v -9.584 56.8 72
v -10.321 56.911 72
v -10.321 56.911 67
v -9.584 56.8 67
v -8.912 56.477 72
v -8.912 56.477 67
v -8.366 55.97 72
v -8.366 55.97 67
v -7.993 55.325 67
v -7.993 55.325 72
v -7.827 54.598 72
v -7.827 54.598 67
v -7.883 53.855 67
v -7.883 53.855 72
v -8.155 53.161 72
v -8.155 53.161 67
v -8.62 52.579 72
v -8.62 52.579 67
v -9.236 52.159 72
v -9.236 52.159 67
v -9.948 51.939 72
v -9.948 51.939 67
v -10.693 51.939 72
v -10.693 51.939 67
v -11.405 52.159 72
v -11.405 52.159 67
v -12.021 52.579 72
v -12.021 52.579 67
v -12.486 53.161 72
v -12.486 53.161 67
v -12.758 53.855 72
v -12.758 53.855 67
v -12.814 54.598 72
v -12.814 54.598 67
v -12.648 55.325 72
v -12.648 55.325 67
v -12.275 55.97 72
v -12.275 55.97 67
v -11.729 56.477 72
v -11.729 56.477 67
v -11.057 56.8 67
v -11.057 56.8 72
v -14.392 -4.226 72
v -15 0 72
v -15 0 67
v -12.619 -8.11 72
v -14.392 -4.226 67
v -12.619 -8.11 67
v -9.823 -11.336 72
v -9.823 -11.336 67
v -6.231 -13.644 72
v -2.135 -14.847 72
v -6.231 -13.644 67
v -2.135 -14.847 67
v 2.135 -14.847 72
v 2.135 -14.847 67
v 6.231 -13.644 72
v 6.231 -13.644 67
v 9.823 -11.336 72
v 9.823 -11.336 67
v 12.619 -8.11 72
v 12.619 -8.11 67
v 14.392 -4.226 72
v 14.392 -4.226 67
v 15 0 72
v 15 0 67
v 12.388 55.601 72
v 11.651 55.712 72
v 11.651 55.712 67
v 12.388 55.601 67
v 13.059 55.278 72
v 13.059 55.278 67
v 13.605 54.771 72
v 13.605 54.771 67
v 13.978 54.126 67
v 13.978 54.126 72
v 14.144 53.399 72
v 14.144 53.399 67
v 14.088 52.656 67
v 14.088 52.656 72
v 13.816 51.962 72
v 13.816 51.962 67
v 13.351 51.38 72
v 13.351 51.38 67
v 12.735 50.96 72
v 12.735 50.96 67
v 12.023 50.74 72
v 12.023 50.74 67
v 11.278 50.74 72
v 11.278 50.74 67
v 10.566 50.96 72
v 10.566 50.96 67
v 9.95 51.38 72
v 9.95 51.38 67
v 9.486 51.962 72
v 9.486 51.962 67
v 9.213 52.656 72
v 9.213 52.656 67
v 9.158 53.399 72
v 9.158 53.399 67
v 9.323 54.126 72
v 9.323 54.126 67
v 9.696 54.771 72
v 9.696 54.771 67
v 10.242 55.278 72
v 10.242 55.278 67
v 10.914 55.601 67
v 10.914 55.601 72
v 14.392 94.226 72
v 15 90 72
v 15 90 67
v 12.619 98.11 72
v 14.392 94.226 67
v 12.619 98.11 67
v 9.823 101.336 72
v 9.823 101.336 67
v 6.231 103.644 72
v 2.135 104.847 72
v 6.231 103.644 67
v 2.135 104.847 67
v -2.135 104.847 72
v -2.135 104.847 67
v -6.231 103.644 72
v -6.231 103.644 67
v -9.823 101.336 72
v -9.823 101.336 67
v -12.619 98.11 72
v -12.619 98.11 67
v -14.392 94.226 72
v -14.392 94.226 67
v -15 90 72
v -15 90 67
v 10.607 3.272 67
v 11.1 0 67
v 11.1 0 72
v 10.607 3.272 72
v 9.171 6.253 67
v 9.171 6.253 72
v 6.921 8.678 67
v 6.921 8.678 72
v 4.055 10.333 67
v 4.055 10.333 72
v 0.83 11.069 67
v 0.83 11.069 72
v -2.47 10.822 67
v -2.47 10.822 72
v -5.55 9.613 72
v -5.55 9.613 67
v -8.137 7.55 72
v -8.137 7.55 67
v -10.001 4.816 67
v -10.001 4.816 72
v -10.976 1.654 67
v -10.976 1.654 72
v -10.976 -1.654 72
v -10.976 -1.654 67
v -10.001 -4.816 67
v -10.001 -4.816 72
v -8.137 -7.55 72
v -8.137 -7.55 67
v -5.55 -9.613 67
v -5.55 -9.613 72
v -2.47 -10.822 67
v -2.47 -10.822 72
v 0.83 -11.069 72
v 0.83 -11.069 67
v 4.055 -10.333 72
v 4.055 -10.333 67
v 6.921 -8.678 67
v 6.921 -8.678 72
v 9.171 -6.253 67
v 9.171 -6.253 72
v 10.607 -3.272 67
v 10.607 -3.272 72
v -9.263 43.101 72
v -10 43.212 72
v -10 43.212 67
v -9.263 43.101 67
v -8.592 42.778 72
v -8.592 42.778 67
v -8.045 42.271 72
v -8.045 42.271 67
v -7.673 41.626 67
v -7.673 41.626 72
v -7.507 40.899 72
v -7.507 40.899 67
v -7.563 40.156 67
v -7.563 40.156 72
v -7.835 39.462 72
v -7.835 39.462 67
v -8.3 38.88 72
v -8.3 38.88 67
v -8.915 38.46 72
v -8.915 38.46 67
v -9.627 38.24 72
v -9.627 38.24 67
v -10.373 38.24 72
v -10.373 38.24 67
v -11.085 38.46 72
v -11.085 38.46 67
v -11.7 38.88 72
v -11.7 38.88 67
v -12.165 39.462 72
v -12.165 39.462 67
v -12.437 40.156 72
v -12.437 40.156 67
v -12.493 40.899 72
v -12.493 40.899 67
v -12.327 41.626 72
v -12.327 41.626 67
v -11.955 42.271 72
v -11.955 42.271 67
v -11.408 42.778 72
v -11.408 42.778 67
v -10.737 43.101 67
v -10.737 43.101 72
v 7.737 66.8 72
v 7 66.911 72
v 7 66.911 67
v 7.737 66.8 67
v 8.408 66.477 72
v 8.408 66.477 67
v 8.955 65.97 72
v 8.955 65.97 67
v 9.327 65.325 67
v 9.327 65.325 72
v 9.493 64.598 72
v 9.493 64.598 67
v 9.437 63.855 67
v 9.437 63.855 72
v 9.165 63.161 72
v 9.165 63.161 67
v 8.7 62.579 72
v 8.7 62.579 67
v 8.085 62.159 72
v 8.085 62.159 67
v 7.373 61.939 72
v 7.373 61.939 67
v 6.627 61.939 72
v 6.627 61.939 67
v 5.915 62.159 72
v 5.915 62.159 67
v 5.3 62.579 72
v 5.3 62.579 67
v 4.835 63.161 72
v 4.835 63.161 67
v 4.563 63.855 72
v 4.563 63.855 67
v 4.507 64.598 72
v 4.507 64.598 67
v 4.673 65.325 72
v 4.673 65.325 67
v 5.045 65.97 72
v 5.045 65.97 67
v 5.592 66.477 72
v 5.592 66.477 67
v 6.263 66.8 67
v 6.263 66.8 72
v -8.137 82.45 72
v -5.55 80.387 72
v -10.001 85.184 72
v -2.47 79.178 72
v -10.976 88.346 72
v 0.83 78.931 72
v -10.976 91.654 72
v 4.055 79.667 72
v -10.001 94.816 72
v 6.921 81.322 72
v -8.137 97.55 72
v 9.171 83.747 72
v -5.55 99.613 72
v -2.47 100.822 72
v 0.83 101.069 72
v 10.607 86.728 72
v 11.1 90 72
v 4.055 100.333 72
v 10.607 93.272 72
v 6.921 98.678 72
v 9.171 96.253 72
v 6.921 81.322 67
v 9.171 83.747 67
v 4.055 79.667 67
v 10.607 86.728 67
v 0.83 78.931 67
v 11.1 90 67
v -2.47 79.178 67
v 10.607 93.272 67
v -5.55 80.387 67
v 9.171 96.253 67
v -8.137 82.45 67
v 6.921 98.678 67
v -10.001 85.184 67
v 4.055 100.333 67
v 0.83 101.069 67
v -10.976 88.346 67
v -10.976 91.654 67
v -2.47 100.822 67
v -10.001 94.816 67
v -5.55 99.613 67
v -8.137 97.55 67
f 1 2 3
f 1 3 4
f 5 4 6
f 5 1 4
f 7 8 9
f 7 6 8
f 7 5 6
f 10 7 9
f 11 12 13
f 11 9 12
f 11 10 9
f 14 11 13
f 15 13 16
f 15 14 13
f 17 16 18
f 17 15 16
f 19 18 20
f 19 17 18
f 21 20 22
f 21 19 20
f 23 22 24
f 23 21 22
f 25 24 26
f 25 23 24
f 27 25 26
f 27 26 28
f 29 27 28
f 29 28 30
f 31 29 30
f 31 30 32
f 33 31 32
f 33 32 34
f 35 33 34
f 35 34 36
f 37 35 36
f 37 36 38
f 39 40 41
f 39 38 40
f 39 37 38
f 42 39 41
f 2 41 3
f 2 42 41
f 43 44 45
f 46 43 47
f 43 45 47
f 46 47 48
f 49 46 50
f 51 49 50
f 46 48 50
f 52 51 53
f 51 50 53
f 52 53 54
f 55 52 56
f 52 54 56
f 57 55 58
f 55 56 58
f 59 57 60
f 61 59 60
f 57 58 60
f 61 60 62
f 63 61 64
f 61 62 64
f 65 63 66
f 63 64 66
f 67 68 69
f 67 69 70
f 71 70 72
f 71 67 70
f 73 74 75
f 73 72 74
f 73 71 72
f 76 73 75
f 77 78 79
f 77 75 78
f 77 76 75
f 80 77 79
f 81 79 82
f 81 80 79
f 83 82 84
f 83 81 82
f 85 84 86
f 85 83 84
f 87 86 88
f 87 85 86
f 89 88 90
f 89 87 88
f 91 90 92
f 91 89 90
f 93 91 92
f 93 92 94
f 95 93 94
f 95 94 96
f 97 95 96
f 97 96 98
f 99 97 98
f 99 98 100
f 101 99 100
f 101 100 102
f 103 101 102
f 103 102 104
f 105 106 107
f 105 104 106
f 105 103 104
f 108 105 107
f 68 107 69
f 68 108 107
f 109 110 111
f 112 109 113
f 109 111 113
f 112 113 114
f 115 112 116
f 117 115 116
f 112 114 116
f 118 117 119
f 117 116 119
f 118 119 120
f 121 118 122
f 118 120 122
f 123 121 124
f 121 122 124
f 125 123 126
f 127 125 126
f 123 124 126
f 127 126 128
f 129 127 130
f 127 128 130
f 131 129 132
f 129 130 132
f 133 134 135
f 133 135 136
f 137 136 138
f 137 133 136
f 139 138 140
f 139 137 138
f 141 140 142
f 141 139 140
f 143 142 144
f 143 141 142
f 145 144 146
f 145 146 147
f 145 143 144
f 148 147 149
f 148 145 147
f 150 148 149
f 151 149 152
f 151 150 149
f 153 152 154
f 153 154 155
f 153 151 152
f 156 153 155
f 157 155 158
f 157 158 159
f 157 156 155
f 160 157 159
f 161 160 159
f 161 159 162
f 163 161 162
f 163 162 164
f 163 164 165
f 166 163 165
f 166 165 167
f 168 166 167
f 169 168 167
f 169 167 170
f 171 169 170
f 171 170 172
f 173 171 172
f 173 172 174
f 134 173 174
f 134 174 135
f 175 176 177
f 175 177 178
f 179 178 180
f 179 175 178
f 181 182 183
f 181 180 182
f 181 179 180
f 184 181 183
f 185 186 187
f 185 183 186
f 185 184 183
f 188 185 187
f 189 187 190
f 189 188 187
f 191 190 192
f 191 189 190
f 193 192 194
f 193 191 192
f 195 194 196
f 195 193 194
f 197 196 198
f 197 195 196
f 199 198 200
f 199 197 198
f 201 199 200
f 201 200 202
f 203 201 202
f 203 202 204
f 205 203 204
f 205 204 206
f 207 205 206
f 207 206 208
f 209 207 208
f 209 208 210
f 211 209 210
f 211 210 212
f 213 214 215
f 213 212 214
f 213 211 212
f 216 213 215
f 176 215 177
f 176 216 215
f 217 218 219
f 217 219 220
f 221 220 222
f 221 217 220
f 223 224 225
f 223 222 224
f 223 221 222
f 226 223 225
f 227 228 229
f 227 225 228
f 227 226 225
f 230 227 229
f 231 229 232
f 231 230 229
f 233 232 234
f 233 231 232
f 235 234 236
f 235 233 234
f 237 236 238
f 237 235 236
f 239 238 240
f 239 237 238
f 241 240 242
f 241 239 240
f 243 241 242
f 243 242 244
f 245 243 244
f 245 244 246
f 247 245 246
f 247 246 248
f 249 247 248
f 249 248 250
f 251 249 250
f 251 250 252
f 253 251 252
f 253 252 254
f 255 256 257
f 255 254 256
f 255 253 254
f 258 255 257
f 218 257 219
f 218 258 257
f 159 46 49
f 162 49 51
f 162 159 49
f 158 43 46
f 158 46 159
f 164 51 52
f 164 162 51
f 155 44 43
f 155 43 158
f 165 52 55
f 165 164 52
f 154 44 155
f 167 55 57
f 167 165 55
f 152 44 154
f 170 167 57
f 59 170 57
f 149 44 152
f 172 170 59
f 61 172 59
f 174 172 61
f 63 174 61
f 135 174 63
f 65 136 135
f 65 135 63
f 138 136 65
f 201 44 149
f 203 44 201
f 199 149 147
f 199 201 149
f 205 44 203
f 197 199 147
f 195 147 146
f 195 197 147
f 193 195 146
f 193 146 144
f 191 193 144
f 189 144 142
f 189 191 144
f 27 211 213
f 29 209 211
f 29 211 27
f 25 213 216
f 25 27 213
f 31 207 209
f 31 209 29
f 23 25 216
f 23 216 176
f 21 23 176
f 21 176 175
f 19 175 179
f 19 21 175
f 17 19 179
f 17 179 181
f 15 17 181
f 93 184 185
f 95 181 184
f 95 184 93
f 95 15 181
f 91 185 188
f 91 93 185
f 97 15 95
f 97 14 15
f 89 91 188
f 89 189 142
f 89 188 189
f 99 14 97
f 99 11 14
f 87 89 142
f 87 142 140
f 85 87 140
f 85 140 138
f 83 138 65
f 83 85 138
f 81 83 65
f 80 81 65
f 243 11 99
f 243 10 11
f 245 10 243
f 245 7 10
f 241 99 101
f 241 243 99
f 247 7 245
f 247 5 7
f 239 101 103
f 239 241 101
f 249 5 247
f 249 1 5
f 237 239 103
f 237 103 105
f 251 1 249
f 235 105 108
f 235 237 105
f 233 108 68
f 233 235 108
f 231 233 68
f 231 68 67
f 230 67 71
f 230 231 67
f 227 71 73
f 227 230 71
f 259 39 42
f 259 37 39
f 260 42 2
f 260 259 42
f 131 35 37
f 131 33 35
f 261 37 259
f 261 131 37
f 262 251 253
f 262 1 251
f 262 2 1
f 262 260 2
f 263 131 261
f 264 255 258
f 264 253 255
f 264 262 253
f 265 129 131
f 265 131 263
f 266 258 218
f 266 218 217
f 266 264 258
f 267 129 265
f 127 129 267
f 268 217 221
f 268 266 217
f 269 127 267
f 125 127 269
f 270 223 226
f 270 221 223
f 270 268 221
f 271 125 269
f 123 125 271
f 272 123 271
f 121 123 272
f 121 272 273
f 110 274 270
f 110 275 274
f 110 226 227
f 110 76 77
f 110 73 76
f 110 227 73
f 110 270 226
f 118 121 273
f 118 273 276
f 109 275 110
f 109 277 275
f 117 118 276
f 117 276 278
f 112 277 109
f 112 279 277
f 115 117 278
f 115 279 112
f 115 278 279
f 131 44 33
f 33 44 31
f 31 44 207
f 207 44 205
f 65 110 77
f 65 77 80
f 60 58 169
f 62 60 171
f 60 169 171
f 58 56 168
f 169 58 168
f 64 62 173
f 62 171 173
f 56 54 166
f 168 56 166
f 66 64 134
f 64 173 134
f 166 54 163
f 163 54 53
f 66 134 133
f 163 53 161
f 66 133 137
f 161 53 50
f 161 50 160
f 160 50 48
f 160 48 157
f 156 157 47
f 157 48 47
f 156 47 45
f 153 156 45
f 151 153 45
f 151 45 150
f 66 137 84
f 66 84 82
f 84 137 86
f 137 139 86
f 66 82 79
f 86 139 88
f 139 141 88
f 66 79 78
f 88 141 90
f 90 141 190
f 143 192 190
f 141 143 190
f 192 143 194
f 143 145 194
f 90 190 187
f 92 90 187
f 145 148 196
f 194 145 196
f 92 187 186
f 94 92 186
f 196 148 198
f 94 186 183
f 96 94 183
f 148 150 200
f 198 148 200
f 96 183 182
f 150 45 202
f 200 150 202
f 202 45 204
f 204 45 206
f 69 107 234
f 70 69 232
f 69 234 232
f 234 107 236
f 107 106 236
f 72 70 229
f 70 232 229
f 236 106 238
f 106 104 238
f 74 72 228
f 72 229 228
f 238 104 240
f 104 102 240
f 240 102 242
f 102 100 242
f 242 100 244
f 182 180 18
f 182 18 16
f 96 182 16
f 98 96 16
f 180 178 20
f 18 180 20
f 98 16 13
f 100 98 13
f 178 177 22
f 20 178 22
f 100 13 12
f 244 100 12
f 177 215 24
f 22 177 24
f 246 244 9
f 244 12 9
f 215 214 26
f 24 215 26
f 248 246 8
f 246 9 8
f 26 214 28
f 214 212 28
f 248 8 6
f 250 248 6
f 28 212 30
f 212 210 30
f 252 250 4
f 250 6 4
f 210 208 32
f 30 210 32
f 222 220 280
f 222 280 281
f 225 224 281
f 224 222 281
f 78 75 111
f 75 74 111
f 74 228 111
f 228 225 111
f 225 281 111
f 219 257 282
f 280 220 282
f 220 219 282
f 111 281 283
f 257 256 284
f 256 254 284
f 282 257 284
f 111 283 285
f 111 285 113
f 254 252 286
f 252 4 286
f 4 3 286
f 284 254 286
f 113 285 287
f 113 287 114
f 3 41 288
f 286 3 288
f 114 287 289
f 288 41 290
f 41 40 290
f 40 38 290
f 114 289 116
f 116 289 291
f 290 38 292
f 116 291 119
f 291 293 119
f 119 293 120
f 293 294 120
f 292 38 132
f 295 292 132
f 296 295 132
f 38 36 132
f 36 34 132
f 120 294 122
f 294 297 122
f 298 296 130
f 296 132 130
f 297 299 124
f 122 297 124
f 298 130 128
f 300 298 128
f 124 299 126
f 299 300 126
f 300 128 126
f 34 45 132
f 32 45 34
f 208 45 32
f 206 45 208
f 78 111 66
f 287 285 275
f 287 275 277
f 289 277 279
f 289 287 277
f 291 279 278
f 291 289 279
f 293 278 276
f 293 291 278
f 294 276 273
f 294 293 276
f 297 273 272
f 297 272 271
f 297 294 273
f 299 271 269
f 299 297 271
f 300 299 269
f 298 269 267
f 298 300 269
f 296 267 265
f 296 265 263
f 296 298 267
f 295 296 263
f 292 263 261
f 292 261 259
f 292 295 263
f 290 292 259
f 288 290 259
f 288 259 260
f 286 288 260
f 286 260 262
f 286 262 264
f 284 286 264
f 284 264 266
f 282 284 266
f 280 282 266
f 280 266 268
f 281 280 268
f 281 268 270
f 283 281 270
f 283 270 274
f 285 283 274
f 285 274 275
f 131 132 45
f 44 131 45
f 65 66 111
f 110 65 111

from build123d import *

# Parameters (mm, degrees)
SKETCH_1_R               = 11.1
EXTRUDE_1_DEPTH          = 72
SKETCH_2_W               = 62
SKETCH_2_H               = 70
SKETCH_2_H_2             = 67.94057246
CUT_EXTRUDE_1_DEPTH      = 70
EXTRUDE_2_DEPTH          = 62
EXTRUDE_3_DEPTH          = 62
CUT_EXTRUDE_3_DEPTH      = 130.811063026
CUT_EXTRUDE_3_DEPTH_BACK = 130.811063026
SKETCH_6_R               = 2.5
CUT_EXTRUDE_4_DEPTH      = 136.359998088
CUT_EXTRUDE_4_DEPTH_BACK = 136.359998088
SKETCH_7_W               = 62
SKETCH_7_H               = 120


with BuildPart() as part:
    # 草图1 → 凸台-拉伸1 (new body)
    with BuildSketch(Plane.XY):
        with BuildLine():
            Line((-15, 90), (-15, 0))
            ThreePointArc((-15, 0), (0, -15), (15, 0))
            Line((15, 0), (15, 90))
            ThreePointArc((15, 90), (0, 105), (-15, 90))
        make_face()
        Circle(SKETCH_1_R, mode=Mode.SUBTRACT)
        with Locations((0, 90)):
            Circle(SKETCH_1_R, mode=Mode.SUBTRACT)
    extrude(amount=EXTRUDE_1_DEPTH)

    # 草图2 → 切除-拉伸1 (cut)
    with BuildSketch(Plane.ZY.offset(15)):
        with Locations((36, 80)):
            Rectangle(SKETCH_2_W, SKETCH_2_H)
        with Locations((36, 11.02971377)):
            Rectangle(SKETCH_2_W, SKETCH_2_H_2)
    extrude(amount=-CUT_EXTRUDE_1_DEPTH, mode=Mode.SUBTRACT)


with BuildPart() as cut_extrude_1_piece_1:
    # of the separate pieces the step leaves, piece 1, a body of its own (cut_extrude_1_pieces)
    add(part.part.solids().sort_by_distance((15, 0, 0))[0])



with BuildPart() as cut_extrude_1_piece_2:
    # of the separate pieces the step leaves, piece 2, a body of its own (cut_extrude_1_pieces)
    add(part.part.solids().sort_by_distance((15, 0, 67))[0])


with BuildPart() as cut_extrude_1_piece_1_1:
    add(cut_extrude_1_piece_1.part)

    add(cut_extrude_1_piece_2.part)  # 凸台-拉伸2 merges 切除-拉伸1 piece 2
    # 草图4 → 凸台-拉伸2 (add)
    with BuildSketch(Plane(origin=(0, 0, 67), x_dir=(-1, 0, 0), z_dir=(0, 0, -1))):
        with BuildLine():
            Line((-4.490156776, 68.758657712), (15, 57.50601045))
            Line((15, 57.50601045), (36.319312502, 12.911360415))
            ThreePointArc((36.319312502, 12.911360415), (35.142094618, 9.577570071), (31.808304274, 10.754787955))
            Line((31.808304274, 10.754787955), (15, 45.913541163))
            Line((15, 45.913541163), (-9.509843224, 60.064305746))
            ThreePointArc((-9.509843224, 60.064305746), (-11.347175983, 66.921324953), (-4.490156776, 68.758657712))
        make_face()
    extrude(amount=EXTRUDE_2_DEPTH)

    # 草图5 → 凸台-拉伸3 (add)
    with BuildSketch(Plane(origin=(0, 0, 67), x_dir=(-1, 0, 0), z_dir=(0, 0, -1))):
        with BuildLine():
            Line((-30.017605928, 49.094069219), (-15, 60.919508718))
            Line((-15, 60.919508718), (12.5, 45.042376315))
            ThreePointArc((12.5, 45.042376315), (14.330127019, 38.212249296), (7.5, 36.382122277))
            Line((7.5, 36.382122277), (-15, 49.372503334))
            Line((-15, 49.372503334), (-27.615908762, 44.780688066))
            ThreePointArc((-27.615908762, 44.780688066), (-30.655195979, 45.913733224), (-30.017605928, 49.094069219))
        make_face()
    extrude(amount=EXTRUDE_3_DEPTH)

    # 草图6 → 切除-拉伸3 (cut, two sides: drawn at the far end of the back side and taken through both)
    with BuildSketch(Plane(origin=(0, 0, 67), x_dir=(-1, 0, 0), z_dir=(0, 0, -1)).offset(-CUT_EXTRUDE_3_DEPTH_BACK)):
        with Locations(Location((-7, 64.411481729, 0), (0, 0, 90))):
            Circle(SKETCH_6_R)
        with Locations(Location((-11.650635095, 53.212249296, 0), (0, 0, 90))):
            Circle(SKETCH_6_R)
        with Locations(Location((10, 40.712249296, 0), (0, 0, 90))):
            Circle(SKETCH_6_R)
        with Locations(Location((10.320508076, 54.411481729, 0), (0, 0, 90))):
            Circle(SKETCH_6_R)
    extrude(amount=CUT_EXTRUDE_3_DEPTH + CUT_EXTRUDE_3_DEPTH_BACK, mode=Mode.SUBTRACT)

    # 草图7 → 切除-拉伸4 (cut, two sides: drawn at the far end of the back side and taken through both)
    with BuildSketch(Plane.ZY.offset(15).offset(-CUT_EXTRUDE_4_DEPTH_BACK)):
        with Locations((36, 45)):
            Rectangle(SKETCH_7_W, SKETCH_7_H)
    extrude(amount=CUT_EXTRUDE_4_DEPTH + CUT_EXTRUDE_4_DEPTH_BACK, mode=Mode.SUBTRACT)


with BuildPart() as cut_extrude_4_piece_1:
    # of the separate pieces the step leaves, piece 1, a body of its own (cut_extrude_4_pieces)
    add(cut_extrude_1_piece_1_1.part.solids().sort_by_distance((-15, 90, 5))[0])


with BuildPart() as cut_extrude_4_piece_2:
    # of the separate pieces the step leaves, piece 2, a body of its own (cut_extrude_4_pieces)
    add(cut_extrude_1_piece_1_1.part.solids().sort_by_distance((15, 0, 67))[0])


solid = cut_extrude_4_piece_2.part
